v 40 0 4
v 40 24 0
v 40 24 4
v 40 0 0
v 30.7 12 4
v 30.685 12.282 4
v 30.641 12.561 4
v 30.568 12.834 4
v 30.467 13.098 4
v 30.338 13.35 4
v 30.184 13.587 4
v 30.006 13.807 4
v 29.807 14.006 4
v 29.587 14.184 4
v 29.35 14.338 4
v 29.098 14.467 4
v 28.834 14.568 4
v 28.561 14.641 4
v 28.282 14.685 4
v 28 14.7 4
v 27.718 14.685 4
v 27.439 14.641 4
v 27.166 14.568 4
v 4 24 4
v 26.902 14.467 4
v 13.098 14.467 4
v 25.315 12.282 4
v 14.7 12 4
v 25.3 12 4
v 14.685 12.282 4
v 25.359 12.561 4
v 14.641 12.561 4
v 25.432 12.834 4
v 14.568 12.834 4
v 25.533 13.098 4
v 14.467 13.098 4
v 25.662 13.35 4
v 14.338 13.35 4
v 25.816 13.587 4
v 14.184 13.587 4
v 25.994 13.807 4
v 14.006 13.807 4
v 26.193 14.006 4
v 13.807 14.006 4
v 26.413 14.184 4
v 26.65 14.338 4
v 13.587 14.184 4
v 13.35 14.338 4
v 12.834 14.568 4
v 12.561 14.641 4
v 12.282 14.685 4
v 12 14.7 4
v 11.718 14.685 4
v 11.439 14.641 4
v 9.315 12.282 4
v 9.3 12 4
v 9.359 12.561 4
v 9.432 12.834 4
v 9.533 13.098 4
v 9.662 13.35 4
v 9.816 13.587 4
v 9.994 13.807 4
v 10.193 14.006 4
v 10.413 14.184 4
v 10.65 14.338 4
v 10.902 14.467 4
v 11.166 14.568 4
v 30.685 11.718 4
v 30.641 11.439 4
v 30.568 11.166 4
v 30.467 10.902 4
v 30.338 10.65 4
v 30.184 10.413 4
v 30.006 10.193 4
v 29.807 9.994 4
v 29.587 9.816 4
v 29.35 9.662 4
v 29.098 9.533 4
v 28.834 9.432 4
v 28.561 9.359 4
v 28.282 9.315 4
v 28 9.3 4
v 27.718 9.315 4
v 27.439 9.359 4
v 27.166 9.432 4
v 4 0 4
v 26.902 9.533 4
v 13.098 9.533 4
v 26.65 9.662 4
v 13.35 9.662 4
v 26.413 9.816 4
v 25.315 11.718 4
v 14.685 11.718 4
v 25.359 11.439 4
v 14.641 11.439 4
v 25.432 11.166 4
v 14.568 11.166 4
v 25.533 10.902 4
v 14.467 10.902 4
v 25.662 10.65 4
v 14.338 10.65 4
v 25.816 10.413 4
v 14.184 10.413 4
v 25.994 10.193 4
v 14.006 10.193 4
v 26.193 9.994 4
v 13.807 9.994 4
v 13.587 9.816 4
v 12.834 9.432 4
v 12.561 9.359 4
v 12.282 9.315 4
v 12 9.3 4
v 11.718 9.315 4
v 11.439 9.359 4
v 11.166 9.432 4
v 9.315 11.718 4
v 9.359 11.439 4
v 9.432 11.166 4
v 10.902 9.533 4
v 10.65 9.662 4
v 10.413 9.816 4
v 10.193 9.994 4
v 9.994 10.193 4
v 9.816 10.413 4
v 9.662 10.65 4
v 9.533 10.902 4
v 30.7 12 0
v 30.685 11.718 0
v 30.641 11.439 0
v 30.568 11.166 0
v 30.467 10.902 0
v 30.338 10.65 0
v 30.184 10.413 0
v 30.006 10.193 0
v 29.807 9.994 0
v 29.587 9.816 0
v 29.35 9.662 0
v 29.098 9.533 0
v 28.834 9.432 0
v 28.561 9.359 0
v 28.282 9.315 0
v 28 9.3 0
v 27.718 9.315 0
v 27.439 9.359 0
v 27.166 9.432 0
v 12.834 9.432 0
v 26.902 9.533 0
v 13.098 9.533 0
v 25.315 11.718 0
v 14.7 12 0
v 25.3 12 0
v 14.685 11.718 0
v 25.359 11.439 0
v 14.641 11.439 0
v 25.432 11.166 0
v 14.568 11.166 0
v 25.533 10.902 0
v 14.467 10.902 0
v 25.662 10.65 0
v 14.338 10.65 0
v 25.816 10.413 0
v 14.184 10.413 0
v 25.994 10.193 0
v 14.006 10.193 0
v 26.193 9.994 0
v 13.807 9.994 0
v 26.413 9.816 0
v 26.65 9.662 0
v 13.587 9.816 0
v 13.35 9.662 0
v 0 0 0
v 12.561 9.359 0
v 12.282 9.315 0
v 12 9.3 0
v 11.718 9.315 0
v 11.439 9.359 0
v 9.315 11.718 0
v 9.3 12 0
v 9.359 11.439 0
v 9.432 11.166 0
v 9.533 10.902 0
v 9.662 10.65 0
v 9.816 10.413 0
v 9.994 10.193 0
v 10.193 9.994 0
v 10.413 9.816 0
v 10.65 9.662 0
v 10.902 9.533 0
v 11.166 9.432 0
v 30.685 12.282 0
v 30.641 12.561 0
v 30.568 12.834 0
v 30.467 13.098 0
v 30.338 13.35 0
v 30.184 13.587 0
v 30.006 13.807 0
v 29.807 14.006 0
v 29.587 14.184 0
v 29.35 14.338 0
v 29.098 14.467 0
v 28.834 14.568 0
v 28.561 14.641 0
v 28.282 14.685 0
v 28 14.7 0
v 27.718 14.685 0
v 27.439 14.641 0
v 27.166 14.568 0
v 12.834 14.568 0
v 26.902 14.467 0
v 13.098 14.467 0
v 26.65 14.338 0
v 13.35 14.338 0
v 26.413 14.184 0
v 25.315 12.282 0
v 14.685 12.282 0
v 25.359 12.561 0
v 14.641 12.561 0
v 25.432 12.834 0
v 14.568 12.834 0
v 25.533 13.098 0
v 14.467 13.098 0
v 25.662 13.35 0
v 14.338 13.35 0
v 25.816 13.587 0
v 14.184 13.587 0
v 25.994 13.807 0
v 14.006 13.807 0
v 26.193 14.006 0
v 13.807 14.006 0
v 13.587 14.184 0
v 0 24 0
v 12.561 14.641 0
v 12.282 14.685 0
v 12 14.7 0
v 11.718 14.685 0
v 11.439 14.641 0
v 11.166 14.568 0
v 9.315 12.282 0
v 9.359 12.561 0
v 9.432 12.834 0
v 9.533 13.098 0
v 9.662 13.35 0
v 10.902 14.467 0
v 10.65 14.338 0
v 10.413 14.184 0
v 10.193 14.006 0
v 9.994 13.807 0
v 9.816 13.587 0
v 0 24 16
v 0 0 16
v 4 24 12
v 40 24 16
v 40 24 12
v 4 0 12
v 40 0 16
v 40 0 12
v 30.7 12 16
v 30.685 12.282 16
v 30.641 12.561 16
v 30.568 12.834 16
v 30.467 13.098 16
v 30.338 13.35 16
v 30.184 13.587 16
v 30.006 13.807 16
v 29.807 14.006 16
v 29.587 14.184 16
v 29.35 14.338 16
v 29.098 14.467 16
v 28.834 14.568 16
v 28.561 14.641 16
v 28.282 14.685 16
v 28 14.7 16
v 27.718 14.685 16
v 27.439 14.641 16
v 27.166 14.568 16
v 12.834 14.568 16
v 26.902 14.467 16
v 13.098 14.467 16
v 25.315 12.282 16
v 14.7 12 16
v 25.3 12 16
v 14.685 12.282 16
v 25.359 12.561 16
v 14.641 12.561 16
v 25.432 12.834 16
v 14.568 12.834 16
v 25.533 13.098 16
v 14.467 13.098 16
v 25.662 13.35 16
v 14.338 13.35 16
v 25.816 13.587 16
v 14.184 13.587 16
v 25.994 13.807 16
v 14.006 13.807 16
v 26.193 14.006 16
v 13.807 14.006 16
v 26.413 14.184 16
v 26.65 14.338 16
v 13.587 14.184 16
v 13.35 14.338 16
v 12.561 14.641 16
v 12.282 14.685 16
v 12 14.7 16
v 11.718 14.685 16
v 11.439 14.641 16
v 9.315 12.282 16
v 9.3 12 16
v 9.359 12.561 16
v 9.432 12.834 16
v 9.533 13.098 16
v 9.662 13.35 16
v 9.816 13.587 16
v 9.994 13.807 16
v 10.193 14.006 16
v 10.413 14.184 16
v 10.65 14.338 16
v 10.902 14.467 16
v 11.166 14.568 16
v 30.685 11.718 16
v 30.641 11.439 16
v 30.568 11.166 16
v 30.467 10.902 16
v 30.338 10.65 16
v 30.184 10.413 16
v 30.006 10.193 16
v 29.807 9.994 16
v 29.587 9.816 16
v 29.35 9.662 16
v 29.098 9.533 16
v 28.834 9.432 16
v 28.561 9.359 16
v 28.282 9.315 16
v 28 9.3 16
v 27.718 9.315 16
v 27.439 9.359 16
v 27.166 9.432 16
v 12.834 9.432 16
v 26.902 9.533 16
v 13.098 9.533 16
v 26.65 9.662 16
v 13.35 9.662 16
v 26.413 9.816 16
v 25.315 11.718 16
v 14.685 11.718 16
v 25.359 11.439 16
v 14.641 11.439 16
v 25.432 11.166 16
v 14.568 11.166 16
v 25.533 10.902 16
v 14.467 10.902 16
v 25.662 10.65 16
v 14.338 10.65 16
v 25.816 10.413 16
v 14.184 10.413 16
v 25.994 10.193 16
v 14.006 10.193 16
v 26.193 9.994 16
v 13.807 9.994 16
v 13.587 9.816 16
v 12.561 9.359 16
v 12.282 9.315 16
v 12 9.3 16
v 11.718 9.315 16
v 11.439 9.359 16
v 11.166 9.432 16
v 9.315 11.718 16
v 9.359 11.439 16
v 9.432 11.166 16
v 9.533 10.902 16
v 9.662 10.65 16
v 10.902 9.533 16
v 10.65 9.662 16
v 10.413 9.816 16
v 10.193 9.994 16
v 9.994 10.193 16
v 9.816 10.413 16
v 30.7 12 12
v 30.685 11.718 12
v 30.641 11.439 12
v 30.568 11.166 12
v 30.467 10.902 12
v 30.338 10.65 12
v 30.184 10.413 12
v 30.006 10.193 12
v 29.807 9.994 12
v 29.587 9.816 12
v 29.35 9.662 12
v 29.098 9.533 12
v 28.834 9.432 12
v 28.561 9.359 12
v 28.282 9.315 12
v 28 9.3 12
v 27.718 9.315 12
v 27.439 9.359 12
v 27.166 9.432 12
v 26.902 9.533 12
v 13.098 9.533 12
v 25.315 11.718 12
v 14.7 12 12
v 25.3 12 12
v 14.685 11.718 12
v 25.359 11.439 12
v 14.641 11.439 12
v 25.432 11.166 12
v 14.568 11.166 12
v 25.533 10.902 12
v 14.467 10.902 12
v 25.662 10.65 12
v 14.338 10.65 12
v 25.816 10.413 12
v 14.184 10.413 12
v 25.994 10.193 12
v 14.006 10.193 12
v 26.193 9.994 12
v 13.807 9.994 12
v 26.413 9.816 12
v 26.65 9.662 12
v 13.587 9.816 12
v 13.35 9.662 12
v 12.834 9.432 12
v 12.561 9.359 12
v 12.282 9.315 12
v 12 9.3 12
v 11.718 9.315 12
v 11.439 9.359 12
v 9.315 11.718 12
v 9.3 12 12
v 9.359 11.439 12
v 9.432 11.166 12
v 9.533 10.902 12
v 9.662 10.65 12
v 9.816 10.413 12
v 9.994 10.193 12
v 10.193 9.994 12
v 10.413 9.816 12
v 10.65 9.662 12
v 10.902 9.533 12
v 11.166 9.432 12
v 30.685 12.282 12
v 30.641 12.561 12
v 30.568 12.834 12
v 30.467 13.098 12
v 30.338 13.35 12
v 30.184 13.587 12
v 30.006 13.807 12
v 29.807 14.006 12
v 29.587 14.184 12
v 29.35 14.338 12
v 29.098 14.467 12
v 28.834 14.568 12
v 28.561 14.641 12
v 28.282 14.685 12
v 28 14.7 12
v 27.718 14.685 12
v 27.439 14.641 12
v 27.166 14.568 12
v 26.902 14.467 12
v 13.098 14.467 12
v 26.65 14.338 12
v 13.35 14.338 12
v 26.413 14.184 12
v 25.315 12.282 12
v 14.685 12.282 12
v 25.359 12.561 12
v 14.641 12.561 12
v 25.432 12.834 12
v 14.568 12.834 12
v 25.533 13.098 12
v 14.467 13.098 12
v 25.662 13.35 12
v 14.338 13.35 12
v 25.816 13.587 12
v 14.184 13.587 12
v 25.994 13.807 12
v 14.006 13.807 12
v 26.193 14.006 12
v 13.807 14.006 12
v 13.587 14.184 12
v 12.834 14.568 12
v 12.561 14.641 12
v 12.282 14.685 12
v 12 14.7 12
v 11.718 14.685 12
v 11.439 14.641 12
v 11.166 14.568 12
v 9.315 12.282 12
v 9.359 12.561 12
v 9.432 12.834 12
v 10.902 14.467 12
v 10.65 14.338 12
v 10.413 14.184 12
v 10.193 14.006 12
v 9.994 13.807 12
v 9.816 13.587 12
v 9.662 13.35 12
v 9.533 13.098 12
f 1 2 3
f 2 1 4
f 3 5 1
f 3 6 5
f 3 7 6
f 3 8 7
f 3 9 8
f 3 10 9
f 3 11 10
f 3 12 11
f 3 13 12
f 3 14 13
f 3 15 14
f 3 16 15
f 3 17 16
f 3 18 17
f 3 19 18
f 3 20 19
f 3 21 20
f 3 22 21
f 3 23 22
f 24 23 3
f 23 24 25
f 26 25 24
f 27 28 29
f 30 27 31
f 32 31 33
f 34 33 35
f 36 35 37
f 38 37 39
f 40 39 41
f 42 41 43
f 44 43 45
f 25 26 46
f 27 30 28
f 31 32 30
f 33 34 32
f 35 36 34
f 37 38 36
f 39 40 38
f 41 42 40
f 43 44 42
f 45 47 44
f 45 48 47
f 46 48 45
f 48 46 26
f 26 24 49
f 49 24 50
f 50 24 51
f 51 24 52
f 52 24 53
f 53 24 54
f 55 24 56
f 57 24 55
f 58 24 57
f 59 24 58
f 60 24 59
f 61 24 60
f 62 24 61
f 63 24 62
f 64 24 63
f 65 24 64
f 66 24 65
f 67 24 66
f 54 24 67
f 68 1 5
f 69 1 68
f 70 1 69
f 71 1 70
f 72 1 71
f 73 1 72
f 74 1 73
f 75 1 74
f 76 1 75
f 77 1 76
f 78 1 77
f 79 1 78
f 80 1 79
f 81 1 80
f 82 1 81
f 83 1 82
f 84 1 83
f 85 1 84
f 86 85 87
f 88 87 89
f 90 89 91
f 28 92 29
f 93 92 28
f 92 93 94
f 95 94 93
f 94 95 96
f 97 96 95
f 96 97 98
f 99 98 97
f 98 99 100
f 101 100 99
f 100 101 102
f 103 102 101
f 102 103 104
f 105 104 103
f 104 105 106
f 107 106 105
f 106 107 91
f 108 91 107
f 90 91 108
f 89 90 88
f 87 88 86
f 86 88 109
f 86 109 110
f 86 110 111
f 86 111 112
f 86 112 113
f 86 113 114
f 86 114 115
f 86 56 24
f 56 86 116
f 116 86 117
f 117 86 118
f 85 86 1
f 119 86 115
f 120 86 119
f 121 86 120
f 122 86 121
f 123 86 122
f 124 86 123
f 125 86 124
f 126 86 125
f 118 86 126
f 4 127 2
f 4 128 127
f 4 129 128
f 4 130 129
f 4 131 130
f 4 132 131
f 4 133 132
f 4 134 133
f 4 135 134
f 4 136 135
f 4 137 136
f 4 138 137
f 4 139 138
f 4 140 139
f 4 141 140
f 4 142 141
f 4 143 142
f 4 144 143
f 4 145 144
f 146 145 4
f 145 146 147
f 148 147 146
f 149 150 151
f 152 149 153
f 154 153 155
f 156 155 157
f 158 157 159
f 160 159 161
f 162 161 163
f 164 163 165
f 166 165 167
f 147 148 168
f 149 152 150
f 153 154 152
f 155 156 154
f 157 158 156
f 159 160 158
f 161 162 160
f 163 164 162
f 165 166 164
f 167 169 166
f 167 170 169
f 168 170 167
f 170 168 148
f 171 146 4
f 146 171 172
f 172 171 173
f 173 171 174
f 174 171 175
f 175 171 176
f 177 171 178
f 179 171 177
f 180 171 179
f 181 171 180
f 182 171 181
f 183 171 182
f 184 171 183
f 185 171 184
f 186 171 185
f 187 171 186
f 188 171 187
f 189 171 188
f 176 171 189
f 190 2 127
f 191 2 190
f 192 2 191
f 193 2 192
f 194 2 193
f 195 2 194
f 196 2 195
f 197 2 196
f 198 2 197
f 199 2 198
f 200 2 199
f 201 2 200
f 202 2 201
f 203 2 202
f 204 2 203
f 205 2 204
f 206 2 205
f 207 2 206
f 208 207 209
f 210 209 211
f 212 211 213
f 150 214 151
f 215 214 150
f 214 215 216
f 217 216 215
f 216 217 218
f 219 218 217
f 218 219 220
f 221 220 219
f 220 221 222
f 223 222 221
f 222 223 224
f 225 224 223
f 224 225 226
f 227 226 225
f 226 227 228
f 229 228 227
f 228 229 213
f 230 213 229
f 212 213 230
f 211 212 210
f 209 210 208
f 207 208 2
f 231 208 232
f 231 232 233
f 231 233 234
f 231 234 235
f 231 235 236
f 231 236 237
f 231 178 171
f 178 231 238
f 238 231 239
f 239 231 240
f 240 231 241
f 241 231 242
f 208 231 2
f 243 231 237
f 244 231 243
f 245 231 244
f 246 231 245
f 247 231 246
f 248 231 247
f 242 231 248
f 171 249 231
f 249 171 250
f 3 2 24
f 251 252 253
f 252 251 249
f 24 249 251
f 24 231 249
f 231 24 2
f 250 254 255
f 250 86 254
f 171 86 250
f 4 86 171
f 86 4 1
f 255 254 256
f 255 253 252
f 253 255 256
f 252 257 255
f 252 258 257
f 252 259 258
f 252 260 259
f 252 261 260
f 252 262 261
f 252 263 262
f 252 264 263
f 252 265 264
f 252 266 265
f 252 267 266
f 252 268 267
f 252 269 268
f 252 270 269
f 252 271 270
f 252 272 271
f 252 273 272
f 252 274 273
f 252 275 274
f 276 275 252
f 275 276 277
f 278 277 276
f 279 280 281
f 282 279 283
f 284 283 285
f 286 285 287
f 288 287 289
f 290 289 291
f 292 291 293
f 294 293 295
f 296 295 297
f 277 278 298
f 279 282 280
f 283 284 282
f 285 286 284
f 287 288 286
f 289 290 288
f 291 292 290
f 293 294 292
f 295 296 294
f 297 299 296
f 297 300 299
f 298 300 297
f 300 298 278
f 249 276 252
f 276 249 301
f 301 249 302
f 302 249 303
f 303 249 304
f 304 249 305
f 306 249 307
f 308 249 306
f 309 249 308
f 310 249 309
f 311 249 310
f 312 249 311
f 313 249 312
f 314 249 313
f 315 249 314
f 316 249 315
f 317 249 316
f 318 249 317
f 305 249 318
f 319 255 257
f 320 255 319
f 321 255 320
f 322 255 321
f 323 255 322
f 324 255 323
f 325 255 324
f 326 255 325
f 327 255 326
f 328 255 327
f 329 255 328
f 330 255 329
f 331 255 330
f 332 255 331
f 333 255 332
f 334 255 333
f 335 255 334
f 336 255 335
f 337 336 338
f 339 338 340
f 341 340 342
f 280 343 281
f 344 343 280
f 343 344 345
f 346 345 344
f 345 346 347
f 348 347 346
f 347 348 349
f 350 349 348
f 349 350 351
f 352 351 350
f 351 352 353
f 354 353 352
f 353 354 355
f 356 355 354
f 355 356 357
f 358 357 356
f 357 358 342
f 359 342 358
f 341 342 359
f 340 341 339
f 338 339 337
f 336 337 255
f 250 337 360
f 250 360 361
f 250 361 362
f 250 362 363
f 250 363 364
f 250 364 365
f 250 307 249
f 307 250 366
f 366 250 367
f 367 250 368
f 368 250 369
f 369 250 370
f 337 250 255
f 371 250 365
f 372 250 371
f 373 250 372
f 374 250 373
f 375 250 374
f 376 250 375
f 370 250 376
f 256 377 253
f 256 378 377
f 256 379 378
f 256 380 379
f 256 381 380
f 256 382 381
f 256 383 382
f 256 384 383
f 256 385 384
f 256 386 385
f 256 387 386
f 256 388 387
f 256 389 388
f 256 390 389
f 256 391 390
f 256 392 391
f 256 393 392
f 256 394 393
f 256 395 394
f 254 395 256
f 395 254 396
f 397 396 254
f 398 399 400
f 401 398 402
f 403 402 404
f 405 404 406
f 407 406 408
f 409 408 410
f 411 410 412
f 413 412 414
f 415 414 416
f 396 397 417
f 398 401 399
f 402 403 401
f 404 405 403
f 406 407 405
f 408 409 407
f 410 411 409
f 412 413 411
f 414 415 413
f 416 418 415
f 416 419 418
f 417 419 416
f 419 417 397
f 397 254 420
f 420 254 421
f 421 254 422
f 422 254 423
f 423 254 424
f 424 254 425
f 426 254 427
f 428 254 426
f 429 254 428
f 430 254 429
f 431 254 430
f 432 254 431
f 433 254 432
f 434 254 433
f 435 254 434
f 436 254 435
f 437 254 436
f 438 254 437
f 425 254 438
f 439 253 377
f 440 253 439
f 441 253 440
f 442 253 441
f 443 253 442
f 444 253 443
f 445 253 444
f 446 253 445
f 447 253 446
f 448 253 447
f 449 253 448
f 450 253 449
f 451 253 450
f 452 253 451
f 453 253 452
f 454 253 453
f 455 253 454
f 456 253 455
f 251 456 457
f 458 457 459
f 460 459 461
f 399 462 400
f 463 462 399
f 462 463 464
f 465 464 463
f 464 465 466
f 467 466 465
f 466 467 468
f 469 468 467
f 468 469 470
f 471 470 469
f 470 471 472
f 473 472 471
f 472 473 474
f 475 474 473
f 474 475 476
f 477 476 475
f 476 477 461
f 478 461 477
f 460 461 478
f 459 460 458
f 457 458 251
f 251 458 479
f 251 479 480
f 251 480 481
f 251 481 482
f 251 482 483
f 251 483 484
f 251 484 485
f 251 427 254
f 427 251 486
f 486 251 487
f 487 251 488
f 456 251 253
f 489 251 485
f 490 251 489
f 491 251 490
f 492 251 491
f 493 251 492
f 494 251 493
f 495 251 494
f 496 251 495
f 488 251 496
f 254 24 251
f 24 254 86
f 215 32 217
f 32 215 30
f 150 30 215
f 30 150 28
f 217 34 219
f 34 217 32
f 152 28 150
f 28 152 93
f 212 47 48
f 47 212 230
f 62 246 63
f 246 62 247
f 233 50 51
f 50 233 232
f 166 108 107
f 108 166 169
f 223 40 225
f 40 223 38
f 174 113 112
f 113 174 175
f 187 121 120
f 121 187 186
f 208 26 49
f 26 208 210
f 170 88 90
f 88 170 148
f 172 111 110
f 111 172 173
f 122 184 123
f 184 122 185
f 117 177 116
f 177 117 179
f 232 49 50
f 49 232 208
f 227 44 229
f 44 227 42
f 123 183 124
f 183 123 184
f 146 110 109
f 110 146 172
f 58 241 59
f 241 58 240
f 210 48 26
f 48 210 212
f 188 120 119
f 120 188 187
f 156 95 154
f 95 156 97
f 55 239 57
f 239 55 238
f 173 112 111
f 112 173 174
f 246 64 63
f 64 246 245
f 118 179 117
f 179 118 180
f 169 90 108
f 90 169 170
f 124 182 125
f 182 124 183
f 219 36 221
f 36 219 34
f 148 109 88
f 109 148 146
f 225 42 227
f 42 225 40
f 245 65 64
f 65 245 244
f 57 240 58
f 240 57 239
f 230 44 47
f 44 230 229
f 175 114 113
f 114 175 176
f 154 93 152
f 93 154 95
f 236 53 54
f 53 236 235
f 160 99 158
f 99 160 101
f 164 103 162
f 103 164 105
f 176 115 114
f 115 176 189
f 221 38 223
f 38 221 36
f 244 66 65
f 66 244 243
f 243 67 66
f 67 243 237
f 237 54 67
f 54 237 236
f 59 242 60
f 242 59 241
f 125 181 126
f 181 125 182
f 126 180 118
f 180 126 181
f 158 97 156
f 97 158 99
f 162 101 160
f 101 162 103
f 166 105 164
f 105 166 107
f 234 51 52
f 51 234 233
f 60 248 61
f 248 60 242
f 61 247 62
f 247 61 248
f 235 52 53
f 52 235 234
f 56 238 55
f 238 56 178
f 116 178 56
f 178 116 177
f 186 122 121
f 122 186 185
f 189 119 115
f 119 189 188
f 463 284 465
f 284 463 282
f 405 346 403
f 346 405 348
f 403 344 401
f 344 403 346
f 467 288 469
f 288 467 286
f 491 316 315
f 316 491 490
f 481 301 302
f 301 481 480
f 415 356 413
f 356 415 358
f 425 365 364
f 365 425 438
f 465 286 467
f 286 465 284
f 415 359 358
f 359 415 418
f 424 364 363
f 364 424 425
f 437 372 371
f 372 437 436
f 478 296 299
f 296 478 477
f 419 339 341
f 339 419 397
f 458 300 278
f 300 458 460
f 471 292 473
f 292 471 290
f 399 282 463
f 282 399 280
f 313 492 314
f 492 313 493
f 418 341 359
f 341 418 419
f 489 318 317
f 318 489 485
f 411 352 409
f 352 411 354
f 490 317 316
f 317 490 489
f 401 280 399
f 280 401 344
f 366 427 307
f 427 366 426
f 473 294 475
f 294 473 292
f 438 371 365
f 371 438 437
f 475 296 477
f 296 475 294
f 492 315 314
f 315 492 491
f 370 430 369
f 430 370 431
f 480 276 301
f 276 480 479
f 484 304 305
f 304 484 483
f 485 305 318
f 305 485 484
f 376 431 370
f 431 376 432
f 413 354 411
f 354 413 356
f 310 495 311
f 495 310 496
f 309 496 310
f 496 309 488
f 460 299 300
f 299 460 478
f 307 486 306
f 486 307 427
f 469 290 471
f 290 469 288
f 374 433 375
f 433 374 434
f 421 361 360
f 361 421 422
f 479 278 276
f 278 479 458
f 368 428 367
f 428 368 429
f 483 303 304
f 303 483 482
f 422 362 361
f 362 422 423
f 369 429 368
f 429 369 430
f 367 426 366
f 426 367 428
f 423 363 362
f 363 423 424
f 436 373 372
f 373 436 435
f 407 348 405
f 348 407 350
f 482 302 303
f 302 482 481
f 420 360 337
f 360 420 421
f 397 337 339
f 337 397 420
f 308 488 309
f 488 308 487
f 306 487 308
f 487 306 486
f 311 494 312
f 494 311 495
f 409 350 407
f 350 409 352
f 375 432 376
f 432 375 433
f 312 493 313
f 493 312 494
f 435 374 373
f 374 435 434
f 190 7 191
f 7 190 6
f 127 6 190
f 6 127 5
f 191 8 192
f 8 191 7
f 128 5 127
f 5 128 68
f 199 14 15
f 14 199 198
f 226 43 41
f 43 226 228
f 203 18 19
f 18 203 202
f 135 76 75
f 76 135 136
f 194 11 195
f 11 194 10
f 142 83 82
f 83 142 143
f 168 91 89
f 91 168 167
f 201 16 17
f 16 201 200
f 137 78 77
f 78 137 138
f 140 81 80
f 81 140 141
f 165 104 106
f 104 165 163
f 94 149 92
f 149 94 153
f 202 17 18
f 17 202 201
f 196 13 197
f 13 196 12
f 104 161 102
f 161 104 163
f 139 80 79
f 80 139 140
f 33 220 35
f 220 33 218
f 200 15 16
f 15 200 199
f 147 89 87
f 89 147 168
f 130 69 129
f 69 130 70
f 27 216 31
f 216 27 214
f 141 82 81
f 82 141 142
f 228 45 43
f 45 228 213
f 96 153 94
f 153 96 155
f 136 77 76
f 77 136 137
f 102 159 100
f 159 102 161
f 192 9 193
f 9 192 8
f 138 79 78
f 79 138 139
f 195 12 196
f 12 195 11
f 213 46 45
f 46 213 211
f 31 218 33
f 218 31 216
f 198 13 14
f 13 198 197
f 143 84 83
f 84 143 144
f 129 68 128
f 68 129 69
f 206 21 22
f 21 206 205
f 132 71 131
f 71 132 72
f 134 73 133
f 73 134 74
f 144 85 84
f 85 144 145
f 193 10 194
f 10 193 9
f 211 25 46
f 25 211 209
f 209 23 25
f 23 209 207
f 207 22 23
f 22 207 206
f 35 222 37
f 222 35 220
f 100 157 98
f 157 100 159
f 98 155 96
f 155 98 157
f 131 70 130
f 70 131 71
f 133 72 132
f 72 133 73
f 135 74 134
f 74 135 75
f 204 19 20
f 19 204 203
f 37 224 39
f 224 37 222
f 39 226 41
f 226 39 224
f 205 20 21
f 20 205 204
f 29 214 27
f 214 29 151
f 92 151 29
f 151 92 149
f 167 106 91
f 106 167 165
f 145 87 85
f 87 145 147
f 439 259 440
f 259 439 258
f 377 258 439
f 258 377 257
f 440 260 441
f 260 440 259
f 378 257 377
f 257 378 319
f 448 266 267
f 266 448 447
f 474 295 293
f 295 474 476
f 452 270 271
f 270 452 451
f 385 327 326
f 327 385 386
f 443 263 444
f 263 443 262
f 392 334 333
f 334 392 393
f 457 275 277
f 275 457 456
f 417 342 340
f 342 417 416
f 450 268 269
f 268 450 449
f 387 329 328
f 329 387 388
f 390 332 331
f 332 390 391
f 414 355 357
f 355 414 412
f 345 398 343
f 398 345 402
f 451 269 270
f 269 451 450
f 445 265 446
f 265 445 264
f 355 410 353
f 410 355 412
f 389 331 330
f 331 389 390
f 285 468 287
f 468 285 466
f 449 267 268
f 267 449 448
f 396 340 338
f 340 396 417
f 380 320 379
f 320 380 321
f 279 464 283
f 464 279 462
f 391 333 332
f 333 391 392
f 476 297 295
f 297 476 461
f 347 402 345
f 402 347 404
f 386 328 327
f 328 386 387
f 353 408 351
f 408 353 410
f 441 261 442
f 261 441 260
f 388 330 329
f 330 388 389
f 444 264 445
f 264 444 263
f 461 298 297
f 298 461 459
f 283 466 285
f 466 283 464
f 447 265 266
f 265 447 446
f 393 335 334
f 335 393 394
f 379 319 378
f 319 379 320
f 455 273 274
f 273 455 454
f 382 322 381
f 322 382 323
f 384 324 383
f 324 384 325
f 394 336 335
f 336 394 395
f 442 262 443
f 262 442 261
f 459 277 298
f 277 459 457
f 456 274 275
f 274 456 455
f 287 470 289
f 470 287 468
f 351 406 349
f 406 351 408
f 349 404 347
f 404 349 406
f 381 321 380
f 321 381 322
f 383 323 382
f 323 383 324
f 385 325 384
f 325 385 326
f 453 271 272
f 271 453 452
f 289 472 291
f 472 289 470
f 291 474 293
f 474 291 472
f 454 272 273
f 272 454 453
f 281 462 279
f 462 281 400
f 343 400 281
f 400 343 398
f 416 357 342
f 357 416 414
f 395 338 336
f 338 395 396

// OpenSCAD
// Z-offset mounting bracket.
$fn = 60;
eps = 0.02;
length = 40;
height = 12;
width = 24;
thickness = 4;
difference() {
    union() {
        cube([length,width,thickness]);
        translate([0,0,height]) cube([length,width,thickness]);
        translate([0,0,thickness]) cube([thickness,width,height-thickness]);
    }
    for (x=[12,length-12]) {
        translate([x,width/2,-eps]) cylinder(d=5.4,h=thickness+2*eps);
        translate([x,width/2,height-eps]) cylinder(d=5.4,h=thickness+2*eps);
    }
}
